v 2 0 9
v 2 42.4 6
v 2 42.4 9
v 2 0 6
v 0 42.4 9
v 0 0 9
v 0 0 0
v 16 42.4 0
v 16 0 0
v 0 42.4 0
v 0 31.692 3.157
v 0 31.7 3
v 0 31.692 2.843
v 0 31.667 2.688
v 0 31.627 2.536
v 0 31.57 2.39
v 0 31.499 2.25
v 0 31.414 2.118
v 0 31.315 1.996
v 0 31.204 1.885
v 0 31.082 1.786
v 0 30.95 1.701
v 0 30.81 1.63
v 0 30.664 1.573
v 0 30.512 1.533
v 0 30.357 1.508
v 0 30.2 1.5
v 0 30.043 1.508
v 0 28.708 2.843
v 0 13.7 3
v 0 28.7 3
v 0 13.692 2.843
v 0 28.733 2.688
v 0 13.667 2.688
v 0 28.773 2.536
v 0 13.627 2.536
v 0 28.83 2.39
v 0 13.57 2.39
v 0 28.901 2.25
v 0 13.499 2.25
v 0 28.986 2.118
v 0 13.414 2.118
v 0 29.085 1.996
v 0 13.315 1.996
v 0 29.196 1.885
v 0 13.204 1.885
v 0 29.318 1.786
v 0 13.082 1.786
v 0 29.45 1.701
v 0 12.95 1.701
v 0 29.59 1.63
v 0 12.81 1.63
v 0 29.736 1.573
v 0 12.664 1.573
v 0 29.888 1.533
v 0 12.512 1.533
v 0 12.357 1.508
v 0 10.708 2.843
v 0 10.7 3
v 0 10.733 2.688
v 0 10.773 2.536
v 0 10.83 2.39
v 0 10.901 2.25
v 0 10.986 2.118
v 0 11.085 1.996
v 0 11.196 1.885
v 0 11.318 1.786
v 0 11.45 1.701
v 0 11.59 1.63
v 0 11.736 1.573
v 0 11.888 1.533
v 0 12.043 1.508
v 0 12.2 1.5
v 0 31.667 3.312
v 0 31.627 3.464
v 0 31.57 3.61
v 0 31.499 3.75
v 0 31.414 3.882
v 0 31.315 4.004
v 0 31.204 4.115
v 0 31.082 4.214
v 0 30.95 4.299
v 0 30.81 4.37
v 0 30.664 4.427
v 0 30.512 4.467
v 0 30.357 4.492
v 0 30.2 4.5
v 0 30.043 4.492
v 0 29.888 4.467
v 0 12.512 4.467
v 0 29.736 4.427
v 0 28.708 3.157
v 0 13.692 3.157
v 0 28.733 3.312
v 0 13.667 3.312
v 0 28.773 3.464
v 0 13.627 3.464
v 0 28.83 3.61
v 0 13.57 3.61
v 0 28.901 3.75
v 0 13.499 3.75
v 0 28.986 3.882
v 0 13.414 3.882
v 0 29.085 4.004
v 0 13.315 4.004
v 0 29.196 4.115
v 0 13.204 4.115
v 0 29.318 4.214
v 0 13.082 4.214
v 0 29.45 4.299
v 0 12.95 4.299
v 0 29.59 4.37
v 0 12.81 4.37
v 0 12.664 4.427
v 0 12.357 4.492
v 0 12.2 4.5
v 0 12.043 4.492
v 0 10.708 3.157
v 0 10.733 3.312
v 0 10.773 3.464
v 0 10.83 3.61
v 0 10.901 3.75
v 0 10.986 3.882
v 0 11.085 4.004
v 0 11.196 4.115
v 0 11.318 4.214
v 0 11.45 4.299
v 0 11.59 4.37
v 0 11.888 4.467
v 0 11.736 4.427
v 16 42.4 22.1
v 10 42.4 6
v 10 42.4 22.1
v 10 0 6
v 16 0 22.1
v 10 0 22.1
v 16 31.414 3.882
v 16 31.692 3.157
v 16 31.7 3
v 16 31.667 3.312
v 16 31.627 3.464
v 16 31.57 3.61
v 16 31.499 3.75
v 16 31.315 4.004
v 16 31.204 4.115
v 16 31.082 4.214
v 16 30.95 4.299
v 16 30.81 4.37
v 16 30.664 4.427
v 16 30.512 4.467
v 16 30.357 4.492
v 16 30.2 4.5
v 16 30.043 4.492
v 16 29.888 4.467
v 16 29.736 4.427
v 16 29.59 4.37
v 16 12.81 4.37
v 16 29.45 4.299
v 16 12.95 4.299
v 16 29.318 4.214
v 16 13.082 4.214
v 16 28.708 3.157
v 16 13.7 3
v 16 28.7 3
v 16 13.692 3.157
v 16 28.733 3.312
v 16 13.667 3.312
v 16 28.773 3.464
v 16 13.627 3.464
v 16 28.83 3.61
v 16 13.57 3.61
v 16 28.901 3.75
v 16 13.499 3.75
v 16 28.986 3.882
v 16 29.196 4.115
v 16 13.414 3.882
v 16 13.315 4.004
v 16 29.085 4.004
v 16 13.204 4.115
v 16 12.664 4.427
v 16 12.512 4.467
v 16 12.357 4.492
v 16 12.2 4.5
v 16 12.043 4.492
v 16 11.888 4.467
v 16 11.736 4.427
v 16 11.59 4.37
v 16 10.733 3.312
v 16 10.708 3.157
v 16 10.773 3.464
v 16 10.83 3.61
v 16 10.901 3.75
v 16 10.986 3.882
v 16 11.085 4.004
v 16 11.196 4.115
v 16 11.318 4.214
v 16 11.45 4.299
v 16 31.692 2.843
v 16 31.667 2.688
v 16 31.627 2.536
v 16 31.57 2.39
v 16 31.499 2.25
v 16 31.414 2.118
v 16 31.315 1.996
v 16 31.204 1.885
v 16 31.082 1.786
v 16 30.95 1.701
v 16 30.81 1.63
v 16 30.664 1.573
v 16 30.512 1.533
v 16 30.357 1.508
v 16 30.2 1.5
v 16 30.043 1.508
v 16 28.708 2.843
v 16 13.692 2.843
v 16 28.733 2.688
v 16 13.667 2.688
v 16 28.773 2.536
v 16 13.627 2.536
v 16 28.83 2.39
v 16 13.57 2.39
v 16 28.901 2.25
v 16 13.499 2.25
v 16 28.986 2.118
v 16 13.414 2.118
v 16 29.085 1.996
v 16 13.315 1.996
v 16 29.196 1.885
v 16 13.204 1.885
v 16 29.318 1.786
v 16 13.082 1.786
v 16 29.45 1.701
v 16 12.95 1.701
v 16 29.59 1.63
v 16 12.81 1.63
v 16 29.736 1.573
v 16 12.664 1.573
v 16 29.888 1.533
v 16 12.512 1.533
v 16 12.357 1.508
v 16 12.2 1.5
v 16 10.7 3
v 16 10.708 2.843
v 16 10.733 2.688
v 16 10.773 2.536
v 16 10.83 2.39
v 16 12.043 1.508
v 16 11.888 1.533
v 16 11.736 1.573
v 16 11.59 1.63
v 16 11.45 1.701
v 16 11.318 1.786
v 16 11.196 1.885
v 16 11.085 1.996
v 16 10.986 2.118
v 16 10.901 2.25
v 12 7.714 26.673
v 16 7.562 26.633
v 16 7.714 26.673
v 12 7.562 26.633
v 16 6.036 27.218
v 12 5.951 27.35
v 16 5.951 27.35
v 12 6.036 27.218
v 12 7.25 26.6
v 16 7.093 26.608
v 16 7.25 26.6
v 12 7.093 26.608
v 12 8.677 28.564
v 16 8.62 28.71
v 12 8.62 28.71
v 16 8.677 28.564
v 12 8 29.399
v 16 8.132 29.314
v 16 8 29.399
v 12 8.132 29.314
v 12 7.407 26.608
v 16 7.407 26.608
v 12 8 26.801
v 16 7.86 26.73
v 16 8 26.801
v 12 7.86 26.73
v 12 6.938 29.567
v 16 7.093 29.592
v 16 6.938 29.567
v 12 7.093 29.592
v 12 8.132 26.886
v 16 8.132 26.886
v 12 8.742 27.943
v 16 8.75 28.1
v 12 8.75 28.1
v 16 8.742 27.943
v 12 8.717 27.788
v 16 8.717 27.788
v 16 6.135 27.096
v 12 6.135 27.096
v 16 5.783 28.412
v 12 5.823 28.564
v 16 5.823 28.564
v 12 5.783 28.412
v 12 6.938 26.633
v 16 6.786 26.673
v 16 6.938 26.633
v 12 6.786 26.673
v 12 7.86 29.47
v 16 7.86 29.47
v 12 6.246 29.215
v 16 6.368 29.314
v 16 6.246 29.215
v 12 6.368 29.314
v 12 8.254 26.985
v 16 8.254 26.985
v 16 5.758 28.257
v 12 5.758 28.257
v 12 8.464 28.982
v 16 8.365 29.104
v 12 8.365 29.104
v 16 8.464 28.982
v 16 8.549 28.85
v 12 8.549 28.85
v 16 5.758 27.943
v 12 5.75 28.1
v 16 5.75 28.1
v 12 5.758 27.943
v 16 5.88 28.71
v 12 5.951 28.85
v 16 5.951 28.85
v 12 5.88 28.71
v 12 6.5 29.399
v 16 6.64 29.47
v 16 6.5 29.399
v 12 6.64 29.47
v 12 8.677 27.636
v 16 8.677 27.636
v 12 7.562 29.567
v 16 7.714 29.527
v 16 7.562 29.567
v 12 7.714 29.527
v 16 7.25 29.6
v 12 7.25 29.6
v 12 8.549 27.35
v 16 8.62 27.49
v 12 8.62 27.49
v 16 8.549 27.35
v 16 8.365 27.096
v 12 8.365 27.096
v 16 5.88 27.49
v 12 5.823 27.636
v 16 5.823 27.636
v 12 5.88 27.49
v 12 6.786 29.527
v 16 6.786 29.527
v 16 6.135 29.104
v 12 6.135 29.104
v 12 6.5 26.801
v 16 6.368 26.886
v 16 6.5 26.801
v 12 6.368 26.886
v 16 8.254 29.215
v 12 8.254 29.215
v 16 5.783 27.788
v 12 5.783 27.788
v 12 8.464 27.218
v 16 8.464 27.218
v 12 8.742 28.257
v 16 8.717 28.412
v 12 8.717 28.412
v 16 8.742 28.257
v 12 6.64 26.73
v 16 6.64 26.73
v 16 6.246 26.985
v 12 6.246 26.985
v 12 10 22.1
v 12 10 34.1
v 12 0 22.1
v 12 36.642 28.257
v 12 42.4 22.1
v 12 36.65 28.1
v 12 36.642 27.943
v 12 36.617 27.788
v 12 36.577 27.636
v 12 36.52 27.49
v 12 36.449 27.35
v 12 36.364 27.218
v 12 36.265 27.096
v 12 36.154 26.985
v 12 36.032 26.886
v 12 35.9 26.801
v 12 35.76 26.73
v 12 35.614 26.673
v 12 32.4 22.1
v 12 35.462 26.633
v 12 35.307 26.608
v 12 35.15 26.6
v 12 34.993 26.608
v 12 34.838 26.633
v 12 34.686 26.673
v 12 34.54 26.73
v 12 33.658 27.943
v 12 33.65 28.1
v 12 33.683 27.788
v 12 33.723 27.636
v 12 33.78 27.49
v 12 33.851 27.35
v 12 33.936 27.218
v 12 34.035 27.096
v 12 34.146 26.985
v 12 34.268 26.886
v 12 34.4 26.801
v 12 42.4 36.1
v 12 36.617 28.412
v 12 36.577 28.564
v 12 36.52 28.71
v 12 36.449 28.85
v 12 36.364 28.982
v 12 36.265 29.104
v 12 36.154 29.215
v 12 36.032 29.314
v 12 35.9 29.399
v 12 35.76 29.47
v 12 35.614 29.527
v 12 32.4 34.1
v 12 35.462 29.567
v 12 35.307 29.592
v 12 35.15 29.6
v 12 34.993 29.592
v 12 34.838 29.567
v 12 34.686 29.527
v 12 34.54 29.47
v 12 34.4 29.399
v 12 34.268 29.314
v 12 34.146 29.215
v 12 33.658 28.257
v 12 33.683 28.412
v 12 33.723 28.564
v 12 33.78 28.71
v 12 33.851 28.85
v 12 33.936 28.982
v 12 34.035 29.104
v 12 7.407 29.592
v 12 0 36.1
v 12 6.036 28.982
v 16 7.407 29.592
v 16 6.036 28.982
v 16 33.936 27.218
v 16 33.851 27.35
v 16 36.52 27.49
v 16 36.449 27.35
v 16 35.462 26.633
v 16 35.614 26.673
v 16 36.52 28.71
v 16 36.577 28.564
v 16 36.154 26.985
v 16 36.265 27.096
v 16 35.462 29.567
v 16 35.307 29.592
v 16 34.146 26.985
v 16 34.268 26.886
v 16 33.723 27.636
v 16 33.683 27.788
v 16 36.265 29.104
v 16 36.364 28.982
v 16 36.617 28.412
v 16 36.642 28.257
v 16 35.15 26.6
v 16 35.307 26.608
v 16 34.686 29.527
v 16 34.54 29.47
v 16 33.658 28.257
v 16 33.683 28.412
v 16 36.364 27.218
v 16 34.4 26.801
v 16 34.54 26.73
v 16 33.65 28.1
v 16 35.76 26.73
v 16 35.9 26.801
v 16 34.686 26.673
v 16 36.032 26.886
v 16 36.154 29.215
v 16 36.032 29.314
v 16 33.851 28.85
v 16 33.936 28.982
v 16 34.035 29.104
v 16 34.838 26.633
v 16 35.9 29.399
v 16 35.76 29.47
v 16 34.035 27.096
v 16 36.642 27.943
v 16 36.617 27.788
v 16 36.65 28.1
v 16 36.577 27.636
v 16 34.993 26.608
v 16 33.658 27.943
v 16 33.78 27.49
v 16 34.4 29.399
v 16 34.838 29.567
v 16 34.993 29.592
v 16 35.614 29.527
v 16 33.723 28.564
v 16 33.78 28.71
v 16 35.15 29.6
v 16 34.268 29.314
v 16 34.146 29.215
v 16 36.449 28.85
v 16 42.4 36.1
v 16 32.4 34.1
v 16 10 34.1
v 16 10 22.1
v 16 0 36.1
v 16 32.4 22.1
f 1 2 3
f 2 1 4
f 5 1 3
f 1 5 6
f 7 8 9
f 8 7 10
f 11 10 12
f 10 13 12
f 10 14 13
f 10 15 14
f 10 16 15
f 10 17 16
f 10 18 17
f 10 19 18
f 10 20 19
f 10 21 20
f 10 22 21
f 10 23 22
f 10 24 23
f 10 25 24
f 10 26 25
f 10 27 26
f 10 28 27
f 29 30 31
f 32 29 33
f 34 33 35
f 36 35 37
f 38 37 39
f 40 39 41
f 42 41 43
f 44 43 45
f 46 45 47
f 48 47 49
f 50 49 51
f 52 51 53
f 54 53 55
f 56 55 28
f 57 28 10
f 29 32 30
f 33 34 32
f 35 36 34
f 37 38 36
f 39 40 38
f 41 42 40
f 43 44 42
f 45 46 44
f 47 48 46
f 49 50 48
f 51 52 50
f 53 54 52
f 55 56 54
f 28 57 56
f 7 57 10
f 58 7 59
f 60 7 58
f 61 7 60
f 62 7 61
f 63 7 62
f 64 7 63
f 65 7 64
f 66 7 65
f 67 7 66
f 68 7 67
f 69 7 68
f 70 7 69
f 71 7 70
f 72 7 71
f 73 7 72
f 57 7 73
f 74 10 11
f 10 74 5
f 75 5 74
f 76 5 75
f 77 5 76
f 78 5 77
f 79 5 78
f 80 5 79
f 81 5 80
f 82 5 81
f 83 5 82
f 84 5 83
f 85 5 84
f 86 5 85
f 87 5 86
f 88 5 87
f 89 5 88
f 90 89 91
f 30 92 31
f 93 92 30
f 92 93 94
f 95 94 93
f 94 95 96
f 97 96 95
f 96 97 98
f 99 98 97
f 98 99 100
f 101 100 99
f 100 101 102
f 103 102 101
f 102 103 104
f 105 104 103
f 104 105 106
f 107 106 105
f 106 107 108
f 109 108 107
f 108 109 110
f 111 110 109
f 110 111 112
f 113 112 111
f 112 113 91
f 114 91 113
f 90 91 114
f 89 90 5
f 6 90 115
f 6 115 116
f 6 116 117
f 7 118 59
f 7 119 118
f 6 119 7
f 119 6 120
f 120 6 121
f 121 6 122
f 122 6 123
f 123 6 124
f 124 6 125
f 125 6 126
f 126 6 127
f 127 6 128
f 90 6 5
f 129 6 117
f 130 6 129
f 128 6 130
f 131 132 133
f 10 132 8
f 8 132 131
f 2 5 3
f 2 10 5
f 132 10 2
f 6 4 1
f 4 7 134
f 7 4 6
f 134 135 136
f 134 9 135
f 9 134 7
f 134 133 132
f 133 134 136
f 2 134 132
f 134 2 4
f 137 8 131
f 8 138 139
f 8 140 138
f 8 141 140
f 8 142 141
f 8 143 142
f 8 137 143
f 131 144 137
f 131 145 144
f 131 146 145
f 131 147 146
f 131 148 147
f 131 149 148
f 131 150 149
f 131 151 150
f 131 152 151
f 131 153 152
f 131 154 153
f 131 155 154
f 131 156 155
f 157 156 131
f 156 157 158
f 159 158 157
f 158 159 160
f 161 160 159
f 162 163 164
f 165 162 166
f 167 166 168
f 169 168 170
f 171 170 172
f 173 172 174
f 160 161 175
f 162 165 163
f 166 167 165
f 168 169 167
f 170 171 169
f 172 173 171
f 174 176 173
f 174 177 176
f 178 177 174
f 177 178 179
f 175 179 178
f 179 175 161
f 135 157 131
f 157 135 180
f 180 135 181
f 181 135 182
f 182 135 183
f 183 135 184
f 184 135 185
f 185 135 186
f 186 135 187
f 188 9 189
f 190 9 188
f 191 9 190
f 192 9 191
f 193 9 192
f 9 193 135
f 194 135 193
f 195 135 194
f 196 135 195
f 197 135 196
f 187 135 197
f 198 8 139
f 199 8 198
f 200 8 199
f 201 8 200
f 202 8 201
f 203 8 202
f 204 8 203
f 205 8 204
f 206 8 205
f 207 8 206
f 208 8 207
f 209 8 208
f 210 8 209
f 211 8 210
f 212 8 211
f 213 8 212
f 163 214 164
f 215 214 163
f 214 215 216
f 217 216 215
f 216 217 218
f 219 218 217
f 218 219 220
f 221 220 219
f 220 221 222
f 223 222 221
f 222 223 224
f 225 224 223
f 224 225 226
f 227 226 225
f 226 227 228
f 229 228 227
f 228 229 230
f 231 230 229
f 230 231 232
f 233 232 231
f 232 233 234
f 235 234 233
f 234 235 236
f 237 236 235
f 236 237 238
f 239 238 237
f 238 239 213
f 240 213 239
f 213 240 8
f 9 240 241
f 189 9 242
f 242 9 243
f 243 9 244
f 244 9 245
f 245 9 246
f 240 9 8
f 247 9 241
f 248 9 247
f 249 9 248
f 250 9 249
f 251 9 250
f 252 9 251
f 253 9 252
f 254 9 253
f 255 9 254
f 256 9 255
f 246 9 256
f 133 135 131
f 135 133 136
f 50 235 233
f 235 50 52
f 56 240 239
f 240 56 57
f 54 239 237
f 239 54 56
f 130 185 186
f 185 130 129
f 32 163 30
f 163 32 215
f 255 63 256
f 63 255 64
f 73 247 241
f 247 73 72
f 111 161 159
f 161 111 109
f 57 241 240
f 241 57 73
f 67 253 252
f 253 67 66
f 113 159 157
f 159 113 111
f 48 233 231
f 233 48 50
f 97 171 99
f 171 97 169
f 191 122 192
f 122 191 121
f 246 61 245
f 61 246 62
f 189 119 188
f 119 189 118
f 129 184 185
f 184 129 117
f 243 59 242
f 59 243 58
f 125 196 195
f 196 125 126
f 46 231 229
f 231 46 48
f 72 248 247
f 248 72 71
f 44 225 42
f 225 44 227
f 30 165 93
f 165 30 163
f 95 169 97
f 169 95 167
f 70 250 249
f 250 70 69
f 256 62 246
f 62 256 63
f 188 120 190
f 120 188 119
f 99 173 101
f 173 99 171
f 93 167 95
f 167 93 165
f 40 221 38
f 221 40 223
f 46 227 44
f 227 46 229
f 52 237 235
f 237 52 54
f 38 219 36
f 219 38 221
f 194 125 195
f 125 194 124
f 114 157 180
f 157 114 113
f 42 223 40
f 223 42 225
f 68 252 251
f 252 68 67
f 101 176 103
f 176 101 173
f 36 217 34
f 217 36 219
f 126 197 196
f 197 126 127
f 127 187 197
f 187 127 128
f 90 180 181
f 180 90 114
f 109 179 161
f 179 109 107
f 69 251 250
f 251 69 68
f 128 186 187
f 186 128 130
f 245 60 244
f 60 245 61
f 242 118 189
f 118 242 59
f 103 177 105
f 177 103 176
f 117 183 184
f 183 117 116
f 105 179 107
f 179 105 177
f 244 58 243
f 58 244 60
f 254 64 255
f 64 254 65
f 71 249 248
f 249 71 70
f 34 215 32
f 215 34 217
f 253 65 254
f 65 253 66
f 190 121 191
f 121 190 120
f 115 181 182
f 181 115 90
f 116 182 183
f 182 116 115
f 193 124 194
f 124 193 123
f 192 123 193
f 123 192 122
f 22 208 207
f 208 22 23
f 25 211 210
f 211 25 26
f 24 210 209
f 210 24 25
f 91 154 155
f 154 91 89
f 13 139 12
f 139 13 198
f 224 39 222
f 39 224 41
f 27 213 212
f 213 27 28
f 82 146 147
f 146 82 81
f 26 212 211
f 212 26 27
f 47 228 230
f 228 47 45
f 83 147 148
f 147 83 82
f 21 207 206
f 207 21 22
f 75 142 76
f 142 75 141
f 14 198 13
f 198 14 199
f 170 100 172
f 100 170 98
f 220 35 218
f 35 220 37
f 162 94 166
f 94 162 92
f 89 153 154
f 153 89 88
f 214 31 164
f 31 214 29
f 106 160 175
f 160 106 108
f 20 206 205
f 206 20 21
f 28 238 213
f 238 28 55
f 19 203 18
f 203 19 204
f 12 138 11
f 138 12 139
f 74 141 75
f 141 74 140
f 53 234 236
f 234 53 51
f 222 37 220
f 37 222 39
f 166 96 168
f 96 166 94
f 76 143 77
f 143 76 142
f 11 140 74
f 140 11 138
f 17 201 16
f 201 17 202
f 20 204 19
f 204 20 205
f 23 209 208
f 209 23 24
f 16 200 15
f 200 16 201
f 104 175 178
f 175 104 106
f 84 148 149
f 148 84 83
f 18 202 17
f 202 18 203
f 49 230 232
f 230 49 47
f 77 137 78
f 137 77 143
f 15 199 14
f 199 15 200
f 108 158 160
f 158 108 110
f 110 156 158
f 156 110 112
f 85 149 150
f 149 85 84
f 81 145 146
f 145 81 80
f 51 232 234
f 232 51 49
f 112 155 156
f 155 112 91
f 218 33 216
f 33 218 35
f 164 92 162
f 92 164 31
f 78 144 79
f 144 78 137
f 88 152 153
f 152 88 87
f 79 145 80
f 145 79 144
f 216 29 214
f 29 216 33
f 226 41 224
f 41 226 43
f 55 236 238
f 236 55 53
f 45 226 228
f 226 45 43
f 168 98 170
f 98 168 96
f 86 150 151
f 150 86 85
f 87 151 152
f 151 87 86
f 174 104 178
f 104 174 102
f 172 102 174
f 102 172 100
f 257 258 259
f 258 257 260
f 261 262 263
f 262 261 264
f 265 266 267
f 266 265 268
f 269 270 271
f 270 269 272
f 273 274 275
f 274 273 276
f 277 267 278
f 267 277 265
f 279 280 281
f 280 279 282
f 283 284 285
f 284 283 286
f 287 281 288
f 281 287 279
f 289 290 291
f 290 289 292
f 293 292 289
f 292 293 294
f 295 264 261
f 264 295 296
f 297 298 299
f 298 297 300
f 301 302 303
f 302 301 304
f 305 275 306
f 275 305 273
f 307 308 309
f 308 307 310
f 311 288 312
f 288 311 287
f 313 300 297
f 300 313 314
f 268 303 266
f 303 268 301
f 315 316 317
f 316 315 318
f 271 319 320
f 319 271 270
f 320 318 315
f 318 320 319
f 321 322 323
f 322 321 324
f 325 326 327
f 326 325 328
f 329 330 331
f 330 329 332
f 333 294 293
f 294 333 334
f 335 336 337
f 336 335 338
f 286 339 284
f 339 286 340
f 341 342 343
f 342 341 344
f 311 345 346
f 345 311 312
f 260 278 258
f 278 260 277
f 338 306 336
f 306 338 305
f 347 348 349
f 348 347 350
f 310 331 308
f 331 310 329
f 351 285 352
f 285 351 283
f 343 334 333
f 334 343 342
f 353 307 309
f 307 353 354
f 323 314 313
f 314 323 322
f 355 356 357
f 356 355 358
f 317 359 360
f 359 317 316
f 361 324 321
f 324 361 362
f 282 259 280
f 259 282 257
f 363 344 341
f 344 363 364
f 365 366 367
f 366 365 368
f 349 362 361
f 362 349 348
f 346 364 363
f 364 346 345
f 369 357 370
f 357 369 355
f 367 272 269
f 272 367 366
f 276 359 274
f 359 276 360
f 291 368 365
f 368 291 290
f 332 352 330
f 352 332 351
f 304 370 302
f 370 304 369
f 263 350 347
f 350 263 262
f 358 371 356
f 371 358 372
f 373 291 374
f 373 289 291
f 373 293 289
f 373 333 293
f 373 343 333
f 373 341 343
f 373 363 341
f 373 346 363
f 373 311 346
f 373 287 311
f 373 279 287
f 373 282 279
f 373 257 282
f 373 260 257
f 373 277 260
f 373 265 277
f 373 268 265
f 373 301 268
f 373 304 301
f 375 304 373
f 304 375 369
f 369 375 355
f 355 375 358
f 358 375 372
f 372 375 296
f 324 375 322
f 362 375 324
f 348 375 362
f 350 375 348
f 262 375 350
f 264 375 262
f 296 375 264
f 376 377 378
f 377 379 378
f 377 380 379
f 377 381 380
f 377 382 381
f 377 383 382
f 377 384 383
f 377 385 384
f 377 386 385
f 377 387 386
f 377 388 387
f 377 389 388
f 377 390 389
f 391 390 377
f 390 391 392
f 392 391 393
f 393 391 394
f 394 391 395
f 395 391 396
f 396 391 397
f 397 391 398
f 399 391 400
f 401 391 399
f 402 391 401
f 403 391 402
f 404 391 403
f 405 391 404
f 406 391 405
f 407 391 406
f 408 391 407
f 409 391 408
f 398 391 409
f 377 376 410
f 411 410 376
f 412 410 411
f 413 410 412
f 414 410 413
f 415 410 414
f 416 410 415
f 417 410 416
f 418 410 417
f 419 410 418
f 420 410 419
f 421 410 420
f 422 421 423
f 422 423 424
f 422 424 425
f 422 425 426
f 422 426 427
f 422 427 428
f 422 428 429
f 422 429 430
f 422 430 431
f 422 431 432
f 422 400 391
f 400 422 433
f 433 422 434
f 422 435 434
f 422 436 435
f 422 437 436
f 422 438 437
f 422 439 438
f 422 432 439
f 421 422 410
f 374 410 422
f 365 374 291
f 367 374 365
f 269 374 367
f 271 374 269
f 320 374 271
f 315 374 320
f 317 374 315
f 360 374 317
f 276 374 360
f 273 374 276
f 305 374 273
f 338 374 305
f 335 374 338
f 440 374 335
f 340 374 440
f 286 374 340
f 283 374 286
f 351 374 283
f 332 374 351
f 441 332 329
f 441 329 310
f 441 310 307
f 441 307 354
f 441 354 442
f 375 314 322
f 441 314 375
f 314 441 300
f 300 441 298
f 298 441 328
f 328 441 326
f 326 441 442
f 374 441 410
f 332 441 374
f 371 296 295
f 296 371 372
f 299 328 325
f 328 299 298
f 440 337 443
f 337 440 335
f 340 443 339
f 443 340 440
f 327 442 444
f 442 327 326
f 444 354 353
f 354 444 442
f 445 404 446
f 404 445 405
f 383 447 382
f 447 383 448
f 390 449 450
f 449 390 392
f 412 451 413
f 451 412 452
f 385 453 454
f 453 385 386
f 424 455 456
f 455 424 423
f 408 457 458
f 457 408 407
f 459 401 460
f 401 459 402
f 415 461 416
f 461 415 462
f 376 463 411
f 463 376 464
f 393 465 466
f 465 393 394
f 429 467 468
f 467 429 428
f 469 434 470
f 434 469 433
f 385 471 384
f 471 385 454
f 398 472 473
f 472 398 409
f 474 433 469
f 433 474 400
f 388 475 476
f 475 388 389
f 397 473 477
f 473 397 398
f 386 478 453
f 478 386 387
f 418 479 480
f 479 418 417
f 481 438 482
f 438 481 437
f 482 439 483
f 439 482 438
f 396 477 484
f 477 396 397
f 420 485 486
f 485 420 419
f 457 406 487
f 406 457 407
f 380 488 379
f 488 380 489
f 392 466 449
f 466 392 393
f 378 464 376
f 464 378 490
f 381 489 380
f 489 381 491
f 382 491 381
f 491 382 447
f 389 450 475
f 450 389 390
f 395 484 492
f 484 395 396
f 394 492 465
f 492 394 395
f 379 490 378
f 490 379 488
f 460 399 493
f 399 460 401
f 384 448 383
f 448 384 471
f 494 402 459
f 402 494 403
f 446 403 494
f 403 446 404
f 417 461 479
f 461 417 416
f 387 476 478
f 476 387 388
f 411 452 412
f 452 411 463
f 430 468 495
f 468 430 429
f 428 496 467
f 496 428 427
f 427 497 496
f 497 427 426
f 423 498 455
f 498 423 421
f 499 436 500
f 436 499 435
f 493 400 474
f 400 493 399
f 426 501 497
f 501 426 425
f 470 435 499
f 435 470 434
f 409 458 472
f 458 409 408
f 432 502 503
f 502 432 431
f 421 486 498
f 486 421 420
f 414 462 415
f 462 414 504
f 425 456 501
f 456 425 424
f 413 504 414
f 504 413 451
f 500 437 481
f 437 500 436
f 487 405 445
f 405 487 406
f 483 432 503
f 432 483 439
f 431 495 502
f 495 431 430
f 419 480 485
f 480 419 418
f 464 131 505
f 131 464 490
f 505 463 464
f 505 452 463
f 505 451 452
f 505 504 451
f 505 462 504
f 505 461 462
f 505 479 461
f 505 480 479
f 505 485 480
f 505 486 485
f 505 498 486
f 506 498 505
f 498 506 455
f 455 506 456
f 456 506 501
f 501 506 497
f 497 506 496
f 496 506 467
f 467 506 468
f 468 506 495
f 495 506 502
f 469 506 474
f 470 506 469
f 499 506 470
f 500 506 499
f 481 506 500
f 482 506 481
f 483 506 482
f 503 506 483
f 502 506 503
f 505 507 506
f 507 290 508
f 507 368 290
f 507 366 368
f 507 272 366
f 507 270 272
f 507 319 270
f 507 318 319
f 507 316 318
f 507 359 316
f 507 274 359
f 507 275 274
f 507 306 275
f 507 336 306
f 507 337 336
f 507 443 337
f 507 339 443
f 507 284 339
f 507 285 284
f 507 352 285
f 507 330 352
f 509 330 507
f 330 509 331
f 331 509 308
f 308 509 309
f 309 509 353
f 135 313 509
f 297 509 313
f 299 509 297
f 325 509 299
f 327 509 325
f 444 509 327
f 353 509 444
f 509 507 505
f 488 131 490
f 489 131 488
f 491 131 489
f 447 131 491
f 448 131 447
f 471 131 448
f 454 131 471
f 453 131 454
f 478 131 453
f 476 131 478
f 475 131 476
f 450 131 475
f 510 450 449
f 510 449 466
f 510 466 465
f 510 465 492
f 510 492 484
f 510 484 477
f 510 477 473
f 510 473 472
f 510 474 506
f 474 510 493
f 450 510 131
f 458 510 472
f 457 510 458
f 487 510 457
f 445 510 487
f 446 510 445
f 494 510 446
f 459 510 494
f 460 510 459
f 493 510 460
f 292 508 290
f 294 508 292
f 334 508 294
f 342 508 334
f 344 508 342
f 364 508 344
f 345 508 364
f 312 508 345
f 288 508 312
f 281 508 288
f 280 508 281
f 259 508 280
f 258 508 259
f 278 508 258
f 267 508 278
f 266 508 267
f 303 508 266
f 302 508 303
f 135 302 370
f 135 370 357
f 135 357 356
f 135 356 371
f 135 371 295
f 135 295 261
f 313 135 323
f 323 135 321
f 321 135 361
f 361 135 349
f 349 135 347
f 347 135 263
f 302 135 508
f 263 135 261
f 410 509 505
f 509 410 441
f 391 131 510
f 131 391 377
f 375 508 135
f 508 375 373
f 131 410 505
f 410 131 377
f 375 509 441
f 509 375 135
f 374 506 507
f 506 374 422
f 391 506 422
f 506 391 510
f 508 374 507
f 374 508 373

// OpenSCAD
include <MCAD/units.scad>

base_height = 6;
servo_length = 12;
servo_width = 22.4;
mount_width = servo_width + 20;
servo_hole_distance = 2.75;
rack_rail_height = 8;
mountingHoleDistance = 18;

$fn = 60;

module ServoMount() {
    difference() {
        union() {
            cube([2, mount_width, base_height + 3]);

            translate([2, 0, 0])
            cube([rack_rail_height, mount_width, base_height]);
            
            translate([2+rack_rail_height, 0, 0])
            cube([6, mount_width, base_height + 11.5 + 4.6]);  
        }

        for (y = [-1, 1])
        translate([0, mount_width/2 + y * mountingHoleDistance / 2, base_height / 2])
        rotate([0, 90, 0])
        translate([0, 0, -epsilon])
        cylinder(r=1.5, h=2+rack_rail_height+6+2*epsilon);
    }

    translate([2+rack_rail_height+2, 0, base_height + 11.5 + 4.6])
    difference() {
        cube([4, mount_width, 14]);
    
        translate([-epsilon, 10, 0])
        cube([4 + epsilon * 2, servo_width, servo_length]);
        
        for (y = [10 - servo_hole_distance, mount_width - 10 + servo_hole_distance])
        translate([0, y, servo_length / 2])
        rotate([0, 90, 0])
        cylinder(r=1.5, h=4 + epsilon * 2);
    }
}

ServoMount();
